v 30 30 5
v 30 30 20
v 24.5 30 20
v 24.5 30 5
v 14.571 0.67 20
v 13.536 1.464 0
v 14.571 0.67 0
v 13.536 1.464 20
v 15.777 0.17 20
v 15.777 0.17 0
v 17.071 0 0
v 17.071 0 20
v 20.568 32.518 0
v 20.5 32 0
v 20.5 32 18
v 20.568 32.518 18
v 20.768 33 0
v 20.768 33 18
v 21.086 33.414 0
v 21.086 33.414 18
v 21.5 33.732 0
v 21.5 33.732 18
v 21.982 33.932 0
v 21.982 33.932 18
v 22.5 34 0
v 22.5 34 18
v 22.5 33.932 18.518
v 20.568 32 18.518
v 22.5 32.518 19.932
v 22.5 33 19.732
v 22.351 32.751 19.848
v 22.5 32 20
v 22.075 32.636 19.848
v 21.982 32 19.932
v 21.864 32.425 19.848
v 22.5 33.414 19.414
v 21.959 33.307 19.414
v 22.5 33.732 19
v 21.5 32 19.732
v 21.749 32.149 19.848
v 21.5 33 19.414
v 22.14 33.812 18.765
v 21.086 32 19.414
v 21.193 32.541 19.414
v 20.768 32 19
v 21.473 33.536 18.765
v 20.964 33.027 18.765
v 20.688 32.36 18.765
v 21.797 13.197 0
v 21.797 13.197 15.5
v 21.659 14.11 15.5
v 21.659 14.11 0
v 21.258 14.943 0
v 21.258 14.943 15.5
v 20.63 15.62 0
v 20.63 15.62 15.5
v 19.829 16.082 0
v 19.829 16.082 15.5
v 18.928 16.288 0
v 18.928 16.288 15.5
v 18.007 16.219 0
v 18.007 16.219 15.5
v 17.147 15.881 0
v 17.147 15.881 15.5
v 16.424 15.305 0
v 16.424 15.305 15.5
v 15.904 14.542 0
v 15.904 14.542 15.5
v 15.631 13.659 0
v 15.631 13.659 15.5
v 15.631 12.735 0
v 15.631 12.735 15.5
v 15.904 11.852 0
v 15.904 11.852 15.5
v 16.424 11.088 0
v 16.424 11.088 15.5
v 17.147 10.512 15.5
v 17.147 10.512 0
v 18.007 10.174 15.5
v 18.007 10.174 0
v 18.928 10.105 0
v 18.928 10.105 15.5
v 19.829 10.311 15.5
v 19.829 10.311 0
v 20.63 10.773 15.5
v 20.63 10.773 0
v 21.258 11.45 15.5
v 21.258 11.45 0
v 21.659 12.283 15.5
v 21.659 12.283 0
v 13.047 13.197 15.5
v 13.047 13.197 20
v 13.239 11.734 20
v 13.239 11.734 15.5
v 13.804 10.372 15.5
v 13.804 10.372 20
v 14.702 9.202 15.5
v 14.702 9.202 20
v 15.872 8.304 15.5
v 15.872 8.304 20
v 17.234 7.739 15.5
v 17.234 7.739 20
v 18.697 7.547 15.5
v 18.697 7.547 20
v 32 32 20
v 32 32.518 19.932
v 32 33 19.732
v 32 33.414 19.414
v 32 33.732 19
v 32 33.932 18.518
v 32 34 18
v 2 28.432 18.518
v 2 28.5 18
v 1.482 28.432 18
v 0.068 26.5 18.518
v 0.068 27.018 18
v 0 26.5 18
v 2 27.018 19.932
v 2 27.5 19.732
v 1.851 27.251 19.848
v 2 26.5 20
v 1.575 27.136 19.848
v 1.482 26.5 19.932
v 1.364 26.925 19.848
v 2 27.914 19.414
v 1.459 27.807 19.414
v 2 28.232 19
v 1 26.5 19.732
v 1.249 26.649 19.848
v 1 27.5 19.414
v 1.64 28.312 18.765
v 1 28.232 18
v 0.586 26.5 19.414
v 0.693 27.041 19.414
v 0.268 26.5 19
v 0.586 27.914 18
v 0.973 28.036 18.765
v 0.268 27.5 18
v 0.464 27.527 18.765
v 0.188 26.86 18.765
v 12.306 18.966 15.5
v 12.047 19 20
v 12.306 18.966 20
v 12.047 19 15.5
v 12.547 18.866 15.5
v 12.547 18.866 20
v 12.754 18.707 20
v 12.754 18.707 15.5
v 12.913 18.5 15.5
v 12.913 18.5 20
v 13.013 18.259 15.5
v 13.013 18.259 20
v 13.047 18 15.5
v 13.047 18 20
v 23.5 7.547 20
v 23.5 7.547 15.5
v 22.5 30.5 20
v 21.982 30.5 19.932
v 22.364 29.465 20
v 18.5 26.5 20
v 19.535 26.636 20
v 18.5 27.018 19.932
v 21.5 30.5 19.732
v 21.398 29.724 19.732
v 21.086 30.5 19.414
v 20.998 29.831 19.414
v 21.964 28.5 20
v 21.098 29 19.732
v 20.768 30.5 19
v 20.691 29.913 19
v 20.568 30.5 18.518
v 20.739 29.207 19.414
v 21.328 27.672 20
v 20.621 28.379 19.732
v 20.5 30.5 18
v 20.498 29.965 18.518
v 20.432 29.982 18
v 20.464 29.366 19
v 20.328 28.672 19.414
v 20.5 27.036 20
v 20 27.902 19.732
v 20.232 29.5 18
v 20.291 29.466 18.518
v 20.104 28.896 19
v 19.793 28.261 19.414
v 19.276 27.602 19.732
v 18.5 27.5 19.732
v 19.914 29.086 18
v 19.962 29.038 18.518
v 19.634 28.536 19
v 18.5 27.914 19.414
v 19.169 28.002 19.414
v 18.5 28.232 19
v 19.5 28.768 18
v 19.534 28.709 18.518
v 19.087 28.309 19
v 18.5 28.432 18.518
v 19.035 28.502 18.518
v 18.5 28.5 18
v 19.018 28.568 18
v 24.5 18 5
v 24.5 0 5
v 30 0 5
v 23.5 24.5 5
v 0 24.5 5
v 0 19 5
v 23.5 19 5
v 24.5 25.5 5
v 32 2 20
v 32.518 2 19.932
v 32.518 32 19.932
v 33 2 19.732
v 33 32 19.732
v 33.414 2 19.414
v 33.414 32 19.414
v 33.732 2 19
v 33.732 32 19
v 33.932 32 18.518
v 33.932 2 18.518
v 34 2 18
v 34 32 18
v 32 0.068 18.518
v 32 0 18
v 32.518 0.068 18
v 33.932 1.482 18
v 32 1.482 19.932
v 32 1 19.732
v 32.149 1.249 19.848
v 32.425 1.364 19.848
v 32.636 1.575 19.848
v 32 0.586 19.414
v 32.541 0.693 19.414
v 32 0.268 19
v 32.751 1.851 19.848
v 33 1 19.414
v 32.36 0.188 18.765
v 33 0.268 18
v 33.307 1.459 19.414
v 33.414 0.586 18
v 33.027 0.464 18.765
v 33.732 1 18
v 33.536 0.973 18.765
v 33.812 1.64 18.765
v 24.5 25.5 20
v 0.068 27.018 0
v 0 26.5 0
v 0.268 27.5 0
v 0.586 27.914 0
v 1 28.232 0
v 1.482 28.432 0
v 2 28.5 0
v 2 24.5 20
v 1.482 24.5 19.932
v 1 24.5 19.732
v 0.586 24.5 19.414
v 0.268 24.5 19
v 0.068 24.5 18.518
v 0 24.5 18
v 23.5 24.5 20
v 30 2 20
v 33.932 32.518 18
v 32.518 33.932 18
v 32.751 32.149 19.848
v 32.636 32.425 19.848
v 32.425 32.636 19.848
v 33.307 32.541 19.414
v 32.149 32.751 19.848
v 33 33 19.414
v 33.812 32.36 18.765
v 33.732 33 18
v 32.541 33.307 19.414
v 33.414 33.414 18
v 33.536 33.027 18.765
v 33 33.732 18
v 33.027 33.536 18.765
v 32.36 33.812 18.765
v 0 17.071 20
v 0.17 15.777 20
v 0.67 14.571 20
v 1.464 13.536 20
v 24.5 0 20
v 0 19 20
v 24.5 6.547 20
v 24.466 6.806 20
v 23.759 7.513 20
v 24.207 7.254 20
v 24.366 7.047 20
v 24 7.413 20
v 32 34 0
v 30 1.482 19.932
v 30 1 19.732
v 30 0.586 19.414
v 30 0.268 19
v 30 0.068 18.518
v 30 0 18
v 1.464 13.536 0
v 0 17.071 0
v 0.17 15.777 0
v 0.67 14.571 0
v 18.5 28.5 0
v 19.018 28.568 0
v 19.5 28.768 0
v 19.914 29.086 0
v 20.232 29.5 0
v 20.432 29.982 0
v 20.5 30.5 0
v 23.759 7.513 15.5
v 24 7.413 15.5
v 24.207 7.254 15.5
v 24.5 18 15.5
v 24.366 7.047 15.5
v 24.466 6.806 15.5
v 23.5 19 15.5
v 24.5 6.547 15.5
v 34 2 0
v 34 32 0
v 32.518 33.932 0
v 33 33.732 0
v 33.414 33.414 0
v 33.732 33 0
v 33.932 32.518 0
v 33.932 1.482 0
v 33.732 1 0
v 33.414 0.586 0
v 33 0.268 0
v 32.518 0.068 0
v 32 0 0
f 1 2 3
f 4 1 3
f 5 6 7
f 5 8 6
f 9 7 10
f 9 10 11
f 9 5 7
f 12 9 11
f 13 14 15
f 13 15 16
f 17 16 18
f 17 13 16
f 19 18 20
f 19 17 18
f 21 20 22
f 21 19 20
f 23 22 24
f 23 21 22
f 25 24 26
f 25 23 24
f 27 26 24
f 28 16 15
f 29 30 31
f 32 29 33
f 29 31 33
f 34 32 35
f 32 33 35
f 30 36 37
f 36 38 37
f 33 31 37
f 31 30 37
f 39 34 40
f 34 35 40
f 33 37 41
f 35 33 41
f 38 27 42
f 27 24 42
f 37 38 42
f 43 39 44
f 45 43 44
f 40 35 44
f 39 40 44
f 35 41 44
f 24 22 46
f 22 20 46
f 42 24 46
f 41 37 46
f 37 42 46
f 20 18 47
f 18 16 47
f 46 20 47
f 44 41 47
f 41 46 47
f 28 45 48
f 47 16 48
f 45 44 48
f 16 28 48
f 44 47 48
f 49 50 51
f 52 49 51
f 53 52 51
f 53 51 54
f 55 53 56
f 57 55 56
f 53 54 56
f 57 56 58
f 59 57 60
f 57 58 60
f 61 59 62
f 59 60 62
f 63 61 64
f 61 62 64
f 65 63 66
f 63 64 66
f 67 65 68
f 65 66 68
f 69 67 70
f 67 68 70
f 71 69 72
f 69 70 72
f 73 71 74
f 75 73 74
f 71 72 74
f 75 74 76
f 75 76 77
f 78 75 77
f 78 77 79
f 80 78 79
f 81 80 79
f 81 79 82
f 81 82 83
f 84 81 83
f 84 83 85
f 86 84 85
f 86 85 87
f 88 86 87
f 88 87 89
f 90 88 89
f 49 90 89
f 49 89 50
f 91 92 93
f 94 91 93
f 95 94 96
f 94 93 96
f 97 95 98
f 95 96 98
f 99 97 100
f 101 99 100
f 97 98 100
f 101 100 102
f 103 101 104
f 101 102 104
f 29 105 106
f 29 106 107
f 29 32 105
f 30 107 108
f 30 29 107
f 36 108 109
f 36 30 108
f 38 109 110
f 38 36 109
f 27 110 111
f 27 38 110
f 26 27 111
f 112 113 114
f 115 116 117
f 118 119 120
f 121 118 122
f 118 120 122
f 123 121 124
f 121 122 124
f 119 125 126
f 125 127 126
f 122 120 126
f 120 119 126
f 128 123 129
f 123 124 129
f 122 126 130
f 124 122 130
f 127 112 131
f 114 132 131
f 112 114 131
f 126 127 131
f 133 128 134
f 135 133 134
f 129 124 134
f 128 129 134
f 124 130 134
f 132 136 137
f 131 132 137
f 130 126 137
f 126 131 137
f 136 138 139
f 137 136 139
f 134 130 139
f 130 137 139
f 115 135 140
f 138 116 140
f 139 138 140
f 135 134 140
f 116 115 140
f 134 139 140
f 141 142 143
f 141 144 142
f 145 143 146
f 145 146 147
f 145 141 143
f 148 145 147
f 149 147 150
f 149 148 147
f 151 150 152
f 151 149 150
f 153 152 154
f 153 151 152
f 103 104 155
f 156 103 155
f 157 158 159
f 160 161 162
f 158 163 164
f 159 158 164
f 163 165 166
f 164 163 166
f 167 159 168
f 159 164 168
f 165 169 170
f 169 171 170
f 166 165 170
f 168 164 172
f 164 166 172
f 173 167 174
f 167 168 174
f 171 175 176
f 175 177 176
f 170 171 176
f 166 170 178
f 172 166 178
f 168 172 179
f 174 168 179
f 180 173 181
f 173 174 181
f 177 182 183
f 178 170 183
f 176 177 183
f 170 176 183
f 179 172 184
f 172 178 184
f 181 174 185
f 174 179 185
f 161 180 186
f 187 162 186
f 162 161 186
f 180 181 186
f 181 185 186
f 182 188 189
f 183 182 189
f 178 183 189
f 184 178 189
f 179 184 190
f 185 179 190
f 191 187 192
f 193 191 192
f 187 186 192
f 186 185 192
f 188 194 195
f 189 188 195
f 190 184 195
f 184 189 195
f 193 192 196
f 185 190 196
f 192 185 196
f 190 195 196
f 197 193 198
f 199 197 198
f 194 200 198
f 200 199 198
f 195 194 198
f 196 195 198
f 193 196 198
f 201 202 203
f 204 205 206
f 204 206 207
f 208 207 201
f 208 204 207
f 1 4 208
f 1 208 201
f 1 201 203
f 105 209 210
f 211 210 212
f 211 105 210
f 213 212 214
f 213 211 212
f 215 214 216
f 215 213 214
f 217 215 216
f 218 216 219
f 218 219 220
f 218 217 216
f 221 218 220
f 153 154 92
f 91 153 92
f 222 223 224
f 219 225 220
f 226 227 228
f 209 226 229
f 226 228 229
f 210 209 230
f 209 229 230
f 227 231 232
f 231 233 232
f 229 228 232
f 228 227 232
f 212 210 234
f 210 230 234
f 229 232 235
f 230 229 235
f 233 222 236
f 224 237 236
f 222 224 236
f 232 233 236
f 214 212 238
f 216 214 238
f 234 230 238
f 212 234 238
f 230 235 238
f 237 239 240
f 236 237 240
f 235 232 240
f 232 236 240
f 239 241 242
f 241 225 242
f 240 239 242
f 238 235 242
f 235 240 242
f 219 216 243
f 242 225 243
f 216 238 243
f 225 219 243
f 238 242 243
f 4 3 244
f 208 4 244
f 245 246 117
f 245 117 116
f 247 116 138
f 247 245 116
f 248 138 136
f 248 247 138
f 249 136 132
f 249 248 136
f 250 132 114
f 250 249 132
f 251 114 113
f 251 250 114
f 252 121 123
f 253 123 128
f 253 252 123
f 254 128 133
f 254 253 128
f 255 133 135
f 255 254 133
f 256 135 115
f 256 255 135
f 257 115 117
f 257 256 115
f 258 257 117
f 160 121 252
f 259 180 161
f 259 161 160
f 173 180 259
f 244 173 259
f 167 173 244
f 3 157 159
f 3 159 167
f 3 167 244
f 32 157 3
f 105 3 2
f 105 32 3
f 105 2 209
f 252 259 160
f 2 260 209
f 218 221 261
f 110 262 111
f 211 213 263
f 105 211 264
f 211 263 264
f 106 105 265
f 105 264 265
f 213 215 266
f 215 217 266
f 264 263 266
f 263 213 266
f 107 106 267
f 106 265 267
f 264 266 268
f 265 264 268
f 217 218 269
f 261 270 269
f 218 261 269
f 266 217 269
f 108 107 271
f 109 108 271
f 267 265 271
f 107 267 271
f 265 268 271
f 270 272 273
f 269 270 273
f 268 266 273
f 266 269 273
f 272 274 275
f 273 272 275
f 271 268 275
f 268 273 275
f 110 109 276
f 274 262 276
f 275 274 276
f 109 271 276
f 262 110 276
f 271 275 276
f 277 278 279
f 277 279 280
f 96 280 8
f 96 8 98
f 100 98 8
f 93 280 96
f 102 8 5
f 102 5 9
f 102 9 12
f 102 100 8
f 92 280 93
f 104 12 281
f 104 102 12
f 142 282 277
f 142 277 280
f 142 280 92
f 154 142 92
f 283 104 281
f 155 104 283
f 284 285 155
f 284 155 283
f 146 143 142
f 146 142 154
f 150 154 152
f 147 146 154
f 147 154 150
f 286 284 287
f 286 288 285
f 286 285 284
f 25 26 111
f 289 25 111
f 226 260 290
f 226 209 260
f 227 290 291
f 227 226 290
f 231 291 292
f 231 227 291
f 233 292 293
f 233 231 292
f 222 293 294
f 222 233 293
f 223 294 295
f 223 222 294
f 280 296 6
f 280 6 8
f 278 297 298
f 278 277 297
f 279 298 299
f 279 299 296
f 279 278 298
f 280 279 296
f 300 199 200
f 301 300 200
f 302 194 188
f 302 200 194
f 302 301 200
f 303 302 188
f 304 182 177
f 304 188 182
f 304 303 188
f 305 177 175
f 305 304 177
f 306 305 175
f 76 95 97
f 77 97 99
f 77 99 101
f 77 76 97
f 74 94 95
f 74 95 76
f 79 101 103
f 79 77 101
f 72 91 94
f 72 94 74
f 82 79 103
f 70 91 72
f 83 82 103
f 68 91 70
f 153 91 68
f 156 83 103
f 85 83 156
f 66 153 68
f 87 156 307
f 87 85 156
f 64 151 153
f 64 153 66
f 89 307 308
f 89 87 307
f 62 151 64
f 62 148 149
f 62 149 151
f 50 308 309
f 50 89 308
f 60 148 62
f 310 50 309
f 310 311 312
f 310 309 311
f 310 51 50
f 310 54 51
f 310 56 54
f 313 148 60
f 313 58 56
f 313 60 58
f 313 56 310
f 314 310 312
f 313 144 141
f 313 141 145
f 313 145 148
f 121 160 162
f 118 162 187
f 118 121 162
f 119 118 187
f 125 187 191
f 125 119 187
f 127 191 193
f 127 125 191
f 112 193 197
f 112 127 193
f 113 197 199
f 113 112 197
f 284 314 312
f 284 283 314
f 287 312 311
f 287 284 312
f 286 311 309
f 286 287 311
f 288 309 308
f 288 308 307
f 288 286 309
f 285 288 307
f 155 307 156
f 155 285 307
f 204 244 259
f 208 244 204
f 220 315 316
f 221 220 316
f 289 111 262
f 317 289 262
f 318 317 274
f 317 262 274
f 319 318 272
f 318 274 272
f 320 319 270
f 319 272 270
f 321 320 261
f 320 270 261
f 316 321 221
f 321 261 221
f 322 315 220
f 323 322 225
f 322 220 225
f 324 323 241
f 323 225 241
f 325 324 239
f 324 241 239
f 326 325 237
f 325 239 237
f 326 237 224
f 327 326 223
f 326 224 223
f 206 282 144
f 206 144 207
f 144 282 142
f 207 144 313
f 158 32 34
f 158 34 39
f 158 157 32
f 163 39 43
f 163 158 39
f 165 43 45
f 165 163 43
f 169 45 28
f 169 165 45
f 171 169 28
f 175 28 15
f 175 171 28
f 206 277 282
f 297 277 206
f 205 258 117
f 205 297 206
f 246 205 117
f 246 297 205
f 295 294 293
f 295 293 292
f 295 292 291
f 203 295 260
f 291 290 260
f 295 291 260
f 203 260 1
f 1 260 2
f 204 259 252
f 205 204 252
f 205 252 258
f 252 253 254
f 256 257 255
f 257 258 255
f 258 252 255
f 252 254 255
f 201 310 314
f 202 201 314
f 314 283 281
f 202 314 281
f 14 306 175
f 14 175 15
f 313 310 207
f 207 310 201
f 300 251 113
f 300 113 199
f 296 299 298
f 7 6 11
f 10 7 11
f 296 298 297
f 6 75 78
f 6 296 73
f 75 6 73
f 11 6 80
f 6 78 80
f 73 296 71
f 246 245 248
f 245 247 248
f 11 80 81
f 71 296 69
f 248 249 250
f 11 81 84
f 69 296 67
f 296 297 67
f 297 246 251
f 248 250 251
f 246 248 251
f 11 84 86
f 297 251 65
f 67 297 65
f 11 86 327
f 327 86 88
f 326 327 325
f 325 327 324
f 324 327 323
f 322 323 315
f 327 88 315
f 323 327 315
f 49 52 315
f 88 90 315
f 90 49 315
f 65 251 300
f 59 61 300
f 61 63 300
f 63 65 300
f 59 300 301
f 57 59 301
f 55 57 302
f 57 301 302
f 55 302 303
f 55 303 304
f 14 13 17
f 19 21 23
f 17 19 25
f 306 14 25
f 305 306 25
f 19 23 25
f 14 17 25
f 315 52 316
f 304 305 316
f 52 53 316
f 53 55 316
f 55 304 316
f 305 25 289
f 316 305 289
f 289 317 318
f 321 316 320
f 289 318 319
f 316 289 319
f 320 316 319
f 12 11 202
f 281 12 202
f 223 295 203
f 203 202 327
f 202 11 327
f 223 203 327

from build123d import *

# Parameters (mm, degrees)
F0_W      = 34
F0_H      = 34
F1_DEPTH  = 20
F3_DEPTH  = 15
F4_SIZE   = 1
F6_W      = 20.5
F6_H      = 5.5
F7_DEPTH  = 20.001
F8_R      = 2
F9_R      = 2
F10_DEPTH = 4.5
F11_R     = 3.1
F12_DEPTH = 15.501
F13_R     = 1
F14_SIZE  = 15
F15_R     = 5


with BuildPart() as f1:
    # F0 (on Top) → F1 (new body)
    with BuildSketch(Plane.XY):
        with Locations((17, 17)):
            Rectangle(F0_W, F0_H)
    extrude(amount=F1_DEPTH)

    # F2 (on face) → F3 (cut)
    with BuildSketch(Plane.XY.offset(20)):
        Polygon((24.5, 0), (30, 0), (30, 30), (24.5, 30), (24.5, 24.5), (0, 24.5), (0, 19), (24.5, 19), align=None)
    extrude(amount=-F3_DEPTH, mode=Mode.SUBTRACT)

    # F4
    f4_edges = [f1.edges().sort_by_distance(p)[0] for p in [
        (24.5, 24.5, 12.5),
        (24.5, 19, 12.5),
    ]]
    chamfer(f4_edges, length=F4_SIZE)

    # F6 (on face) → F7 (cut, through all)
    with BuildSketch(Plane.XY.offset(20)):
        with Locations((10.25, 31.25)):
            Rectangle(F6_W, F6_H)
    extrude(amount=-F7_DEPTH, mode=Mode.SUBTRACT)

    # F8
    f8_edges = [f1.edges().sort_by_distance(p)[0] for p in [
        (0, 28.5, 10),
        (20.5, 28.5, 10),
        (20.5, 34, 10),
        (34, 34, 10),
        (34, 0, 10),
    ]]
    fillet(f8_edges, radius=F8_R)

    # F9
    f9_edges = [f1.edges().sort_by_distance(p)[0] for p in [
        (31, 0, 20),
    ]]
    fillet(f9_edges, radius=F9_R)

    # F5 (on face) → F10 (cut)
    with BuildSketch(Plane.XY.offset(20)):
        with BuildLine():
            Line((13.0466991411, 20.6966991411), (13.0466991411, 13.1966991411))
            ThreePointArc((13.0466991411, 13.1966991411), (14.7015458274, 9.2015458274), (18.6966991411, 7.5466991411))
            Line((18.6966991411, 7.5466991411), (26.0466991411, 7.5466991411))
            Line((26.0466991411, 7.5466991411), (26.0466991411, 20.6966991411))
            Line((26.0466991411, 20.6966991411), (13.0466991411, 20.6966991411))
        make_face()
    extrude(amount=-F10_DEPTH, mode=Mode.SUBTRACT)

    # F11 (on face) → F12 (cut, through all)
    with BuildSketch(Plane.XY.offset(15.5)):
        with Locations((18.6966991411, 13.1966991411)):
            Circle(F11_R)
    extrude(amount=-F12_DEPTH, mode=Mode.SUBTRACT)

    # F13
    f13_edges = [f1.edges().sort_by_distance(p)[0] for p in [
        (13.046699, 19, 17.75),
        (24.5, 7.546699, 17.75),
    ]]
    fillet(f13_edges, radius=F13_R)

    # F14
    f14_edges = [f1.edges().sort_by_distance(p)[0] for p in [
        (0, 0, 10),
    ]]
    chamfer(f14_edges, length=F14_SIZE)

    # F15
    f15_edges = [f1.edges().sort_by_distance(p)[0] for p in [
        (0, 15, 10),
        (15, 0, 10),
    ]]
    fillet(f15_edges, radius=F15_R)


solid = f1.part
